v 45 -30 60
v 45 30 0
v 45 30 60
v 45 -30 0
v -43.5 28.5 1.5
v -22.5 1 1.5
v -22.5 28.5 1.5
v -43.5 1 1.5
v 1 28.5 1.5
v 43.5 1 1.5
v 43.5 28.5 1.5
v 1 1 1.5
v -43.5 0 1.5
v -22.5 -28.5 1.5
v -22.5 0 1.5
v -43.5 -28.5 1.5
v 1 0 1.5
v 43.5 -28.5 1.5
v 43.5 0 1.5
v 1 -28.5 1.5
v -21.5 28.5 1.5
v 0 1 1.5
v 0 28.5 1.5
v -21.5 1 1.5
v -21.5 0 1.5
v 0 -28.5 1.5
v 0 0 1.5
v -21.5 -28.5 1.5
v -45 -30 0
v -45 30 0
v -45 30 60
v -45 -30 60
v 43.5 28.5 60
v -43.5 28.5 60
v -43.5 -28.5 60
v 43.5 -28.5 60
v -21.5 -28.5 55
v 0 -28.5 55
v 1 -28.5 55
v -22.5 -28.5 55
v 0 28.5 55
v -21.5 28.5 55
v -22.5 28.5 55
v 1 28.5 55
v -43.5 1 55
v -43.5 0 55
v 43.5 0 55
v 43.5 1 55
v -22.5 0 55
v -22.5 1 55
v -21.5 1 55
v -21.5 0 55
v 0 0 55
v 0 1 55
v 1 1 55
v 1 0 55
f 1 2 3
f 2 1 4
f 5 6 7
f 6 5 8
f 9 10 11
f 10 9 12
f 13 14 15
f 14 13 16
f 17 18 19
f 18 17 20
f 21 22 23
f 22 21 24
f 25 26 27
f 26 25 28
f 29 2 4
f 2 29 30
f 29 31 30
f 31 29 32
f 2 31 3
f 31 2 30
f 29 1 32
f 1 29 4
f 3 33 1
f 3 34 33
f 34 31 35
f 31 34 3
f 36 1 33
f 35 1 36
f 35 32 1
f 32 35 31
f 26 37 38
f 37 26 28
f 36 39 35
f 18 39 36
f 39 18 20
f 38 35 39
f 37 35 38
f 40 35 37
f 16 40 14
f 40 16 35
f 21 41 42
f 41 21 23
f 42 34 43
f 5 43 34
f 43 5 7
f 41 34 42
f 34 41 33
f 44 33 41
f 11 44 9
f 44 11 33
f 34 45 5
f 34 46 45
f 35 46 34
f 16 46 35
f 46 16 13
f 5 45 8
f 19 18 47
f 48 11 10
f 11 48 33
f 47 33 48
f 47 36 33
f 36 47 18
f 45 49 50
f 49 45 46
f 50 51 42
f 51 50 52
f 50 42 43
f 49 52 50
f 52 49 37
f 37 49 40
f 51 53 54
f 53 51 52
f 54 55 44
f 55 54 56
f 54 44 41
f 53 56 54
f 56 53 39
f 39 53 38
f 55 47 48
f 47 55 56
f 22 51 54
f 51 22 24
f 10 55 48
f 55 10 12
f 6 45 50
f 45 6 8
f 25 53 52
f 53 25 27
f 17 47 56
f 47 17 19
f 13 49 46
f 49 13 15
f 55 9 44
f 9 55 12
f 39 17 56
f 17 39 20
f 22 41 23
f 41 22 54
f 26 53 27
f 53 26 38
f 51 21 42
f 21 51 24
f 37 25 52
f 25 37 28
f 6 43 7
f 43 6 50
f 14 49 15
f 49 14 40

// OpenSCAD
/*
Simple Tool Box (c) by Jorge Monteiro

Simple Tool Box is licensed under a
Creative Commons Attribution-ShareAlike 4.0 International.

You should have received a copy of the license along with this
work.  If not, see <http://creativecommons.org/licenses/by-sa/4.0/>.
*/
wallThickness = 1.5;
boxWidth = 90;
boxLength = 60;
boxHeight = 60;
separatorTopGap = 5;
separatorThickness = 1;

drawBox();
drawSeparators();

module drawSeparators() {
    separatorVertGrid = boxWidth/4;
    // Draw the walls
    translate([-boxWidth/2, 0, 0]) cube([boxWidth, separatorThickness, boxHeight-separatorTopGap]);
    translate([0, -boxLength/2, 0]) cube([separatorThickness, boxLength, boxHeight-separatorTopGap]);
    translate([-separatorVertGrid, -boxLength/2, 0]) cube([separatorThickness, boxLength, boxHeight-separatorTopGap]);
};

module drawBox() {
    // Draw the base
    translate([-boxWidth/2, -boxLength/2, 0]) cube([boxWidth,boxLength,wallThickness]);
    // Draw the walls
    translate([-boxWidth/2, -boxLength/2, 0]) cube([boxWidth, wallThickness, boxHeight]);
    translate([-boxWidth/2, boxLength/2-wallThickness, 0]) cube([boxWidth, wallThickness, boxHeight]);
    translate([-boxWidth/2, -boxLength/2, 0]) cube([wallThickness, boxLength, boxHeight]);
    translate([boxWidth/2-wallThickness, -boxLength/2, 0]) cube([wallThickness, boxLength, boxHeight]);
};
